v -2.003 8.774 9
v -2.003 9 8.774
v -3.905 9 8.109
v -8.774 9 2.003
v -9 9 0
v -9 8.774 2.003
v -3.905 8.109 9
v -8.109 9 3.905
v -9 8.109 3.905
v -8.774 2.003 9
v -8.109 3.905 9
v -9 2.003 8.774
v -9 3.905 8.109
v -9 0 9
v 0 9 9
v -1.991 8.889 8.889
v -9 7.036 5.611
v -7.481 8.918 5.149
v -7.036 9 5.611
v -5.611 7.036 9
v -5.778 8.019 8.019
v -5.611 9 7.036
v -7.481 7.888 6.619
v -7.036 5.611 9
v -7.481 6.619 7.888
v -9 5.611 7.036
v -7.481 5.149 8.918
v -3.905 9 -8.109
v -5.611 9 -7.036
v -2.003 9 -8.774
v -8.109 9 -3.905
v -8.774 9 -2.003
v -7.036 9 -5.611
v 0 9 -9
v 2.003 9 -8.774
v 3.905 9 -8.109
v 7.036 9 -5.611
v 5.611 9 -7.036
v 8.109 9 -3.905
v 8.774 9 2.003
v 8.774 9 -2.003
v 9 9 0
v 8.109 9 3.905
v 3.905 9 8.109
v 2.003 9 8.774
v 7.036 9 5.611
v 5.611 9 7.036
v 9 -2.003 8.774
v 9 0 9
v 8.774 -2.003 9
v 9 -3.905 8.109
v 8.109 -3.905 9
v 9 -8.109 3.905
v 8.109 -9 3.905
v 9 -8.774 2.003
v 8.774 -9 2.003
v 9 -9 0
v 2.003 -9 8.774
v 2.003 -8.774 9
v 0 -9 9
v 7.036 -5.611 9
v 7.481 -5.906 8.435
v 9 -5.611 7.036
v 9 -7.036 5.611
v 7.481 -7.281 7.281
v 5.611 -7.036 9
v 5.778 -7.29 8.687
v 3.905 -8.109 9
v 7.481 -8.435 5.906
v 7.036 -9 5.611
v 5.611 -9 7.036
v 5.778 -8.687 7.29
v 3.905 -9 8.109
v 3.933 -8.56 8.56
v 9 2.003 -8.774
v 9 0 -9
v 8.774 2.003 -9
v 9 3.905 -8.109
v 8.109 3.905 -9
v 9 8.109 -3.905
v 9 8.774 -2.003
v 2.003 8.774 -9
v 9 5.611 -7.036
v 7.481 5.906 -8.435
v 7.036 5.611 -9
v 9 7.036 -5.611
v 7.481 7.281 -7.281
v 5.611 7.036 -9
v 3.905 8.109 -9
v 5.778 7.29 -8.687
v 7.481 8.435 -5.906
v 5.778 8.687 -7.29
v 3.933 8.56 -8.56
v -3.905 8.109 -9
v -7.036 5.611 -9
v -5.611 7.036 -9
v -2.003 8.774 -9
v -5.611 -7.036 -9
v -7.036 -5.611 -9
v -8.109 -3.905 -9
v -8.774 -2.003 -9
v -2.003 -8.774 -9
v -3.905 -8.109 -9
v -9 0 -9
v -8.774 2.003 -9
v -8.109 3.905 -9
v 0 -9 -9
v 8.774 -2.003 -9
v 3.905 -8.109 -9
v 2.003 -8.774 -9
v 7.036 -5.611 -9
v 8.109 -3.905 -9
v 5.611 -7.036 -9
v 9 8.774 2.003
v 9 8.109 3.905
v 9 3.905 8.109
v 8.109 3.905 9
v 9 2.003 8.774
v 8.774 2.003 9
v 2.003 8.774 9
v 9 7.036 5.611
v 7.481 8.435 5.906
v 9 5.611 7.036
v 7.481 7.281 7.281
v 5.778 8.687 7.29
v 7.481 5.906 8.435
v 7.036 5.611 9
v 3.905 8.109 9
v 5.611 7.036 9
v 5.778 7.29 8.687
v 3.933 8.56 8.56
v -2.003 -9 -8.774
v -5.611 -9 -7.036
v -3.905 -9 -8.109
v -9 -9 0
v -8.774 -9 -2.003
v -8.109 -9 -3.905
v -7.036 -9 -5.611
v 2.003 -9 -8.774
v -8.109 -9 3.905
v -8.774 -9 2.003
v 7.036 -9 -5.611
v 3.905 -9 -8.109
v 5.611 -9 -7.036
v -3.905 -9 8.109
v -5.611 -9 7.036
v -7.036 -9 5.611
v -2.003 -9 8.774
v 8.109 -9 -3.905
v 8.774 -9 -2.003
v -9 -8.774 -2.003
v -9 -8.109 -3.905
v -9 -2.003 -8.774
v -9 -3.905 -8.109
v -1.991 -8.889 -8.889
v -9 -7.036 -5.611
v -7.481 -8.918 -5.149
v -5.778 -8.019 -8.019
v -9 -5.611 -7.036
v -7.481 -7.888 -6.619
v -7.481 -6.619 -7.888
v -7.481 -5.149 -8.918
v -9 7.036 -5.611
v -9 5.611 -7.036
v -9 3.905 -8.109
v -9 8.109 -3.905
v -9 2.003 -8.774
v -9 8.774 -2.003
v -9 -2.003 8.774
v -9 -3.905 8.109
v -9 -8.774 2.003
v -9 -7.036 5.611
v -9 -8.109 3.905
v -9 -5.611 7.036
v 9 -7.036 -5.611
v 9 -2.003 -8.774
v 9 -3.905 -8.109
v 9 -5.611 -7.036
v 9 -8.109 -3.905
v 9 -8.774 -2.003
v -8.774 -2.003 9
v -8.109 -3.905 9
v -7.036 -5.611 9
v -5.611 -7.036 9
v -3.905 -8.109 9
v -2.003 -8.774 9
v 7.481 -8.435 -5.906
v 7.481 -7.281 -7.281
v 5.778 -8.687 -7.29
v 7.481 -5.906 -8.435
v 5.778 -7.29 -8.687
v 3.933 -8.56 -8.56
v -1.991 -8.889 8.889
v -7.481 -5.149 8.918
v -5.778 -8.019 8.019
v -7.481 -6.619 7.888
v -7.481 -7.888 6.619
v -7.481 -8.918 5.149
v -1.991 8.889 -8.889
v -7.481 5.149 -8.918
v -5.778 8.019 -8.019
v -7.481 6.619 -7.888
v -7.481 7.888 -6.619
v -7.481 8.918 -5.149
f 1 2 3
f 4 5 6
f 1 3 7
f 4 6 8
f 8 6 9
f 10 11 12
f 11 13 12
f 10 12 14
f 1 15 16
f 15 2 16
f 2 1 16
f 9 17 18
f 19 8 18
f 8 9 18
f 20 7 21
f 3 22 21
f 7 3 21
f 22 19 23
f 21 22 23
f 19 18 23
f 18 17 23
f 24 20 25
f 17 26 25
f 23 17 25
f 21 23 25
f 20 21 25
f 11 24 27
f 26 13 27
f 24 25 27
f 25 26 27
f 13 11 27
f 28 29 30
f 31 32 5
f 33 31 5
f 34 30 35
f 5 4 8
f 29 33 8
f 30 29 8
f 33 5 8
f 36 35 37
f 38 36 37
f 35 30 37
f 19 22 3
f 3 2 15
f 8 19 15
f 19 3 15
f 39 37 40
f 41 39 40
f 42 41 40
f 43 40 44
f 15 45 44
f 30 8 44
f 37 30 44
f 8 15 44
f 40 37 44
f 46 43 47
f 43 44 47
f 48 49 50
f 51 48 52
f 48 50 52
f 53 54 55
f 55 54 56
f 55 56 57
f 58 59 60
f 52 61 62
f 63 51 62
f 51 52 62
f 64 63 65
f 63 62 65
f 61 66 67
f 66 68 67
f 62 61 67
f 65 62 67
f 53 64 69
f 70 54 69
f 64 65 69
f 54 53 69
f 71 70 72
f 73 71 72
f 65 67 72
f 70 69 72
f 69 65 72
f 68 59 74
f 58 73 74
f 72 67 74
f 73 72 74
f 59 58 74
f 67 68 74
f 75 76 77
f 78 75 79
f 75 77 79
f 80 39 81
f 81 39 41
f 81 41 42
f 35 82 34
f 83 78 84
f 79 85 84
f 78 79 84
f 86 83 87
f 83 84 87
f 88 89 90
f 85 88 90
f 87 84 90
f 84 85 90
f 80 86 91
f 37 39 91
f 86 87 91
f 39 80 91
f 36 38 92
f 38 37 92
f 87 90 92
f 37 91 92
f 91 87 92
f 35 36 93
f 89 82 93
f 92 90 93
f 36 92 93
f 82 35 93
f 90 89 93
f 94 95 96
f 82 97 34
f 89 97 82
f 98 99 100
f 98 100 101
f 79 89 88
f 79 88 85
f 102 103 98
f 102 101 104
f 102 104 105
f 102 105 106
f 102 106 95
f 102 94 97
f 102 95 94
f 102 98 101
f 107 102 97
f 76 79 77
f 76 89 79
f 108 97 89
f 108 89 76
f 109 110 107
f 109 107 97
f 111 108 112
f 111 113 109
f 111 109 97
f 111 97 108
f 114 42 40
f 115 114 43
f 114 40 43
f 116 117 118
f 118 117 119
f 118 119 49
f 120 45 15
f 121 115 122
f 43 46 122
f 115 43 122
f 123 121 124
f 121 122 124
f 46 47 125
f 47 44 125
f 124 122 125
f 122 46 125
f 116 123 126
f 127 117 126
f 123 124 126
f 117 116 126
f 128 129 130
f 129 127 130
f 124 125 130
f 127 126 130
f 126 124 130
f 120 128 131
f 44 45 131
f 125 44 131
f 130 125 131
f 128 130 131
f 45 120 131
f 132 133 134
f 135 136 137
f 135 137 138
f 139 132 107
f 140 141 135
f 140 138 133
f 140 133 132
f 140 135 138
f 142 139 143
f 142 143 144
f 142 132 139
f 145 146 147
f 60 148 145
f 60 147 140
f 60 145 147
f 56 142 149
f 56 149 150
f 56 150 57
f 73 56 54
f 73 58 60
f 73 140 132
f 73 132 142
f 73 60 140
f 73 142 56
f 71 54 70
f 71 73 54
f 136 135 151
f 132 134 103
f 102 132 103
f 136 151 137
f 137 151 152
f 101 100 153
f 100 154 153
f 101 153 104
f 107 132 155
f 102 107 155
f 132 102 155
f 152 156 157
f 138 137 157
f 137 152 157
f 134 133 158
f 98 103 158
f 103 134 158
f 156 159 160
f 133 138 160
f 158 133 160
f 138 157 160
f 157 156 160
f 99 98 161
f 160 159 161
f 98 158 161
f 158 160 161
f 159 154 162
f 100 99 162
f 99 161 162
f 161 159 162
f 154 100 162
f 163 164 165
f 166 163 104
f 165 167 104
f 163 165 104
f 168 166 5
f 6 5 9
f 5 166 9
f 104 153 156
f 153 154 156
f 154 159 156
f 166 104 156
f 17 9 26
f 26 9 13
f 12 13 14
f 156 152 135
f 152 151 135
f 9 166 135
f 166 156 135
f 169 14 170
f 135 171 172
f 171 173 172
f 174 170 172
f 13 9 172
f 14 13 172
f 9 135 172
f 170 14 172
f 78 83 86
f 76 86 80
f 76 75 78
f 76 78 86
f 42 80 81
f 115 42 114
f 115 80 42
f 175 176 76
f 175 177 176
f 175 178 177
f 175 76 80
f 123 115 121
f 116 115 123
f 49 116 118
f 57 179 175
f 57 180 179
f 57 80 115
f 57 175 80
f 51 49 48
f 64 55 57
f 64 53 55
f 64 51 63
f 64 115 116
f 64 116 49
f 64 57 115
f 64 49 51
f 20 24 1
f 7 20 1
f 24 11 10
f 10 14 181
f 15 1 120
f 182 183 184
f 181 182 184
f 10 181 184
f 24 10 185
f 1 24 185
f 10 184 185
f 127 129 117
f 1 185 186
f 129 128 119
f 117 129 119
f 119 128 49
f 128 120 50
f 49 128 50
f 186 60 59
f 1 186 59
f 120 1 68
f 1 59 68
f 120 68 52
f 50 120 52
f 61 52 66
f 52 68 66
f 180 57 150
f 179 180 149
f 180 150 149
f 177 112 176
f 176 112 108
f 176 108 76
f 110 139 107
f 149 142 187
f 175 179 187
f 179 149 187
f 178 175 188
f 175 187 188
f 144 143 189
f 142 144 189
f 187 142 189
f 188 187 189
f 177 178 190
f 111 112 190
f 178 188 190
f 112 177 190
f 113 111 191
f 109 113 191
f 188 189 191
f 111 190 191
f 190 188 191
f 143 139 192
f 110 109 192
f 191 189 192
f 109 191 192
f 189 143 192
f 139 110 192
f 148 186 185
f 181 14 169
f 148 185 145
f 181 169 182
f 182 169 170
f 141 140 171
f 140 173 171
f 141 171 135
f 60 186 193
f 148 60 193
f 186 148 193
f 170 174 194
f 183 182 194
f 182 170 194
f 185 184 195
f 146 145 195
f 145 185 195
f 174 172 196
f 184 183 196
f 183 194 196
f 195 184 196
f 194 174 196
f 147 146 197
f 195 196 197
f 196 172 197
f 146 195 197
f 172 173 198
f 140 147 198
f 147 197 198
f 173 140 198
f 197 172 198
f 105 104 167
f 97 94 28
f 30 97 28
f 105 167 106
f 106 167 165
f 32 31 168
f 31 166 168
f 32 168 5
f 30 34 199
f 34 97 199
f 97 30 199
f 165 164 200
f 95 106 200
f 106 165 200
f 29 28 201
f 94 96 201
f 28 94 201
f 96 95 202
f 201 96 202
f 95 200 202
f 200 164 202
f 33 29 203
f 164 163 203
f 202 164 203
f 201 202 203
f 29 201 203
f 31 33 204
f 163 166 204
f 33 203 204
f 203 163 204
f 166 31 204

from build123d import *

# Parameters (mm, degrees)
F0_W     = 18
F0_H     = 18
F1_DEPTH = 9


with BuildPart() as f1:
    # F0 (on Front) → F1 (new body, symmetric)
    with BuildSketch(Plane.XZ):
        Rectangle(F0_W, F0_H)
    extrude(amount=F1_DEPTH, both=True)


with BuildPart() as f3:
    # F2 (on Front) → F3 (revolve)
    with BuildSketch(Plane.XZ):
        with BuildLine():
            Line((-12.727922, 0), (12.727922, 0))
            ThreePointArc((12.727922, 0), (0, 12.727922), (-12.727922, 0))
        make_face()
    revolve(axis=Axis((0.310661, 0, 0), (1, 0, 0)))


with BuildPart() as f1_1:
    add(f1.part)

    # F4: intersect F3
    add(f3.part, mode=Mode.INTERSECT)


solid = f1_1.part
